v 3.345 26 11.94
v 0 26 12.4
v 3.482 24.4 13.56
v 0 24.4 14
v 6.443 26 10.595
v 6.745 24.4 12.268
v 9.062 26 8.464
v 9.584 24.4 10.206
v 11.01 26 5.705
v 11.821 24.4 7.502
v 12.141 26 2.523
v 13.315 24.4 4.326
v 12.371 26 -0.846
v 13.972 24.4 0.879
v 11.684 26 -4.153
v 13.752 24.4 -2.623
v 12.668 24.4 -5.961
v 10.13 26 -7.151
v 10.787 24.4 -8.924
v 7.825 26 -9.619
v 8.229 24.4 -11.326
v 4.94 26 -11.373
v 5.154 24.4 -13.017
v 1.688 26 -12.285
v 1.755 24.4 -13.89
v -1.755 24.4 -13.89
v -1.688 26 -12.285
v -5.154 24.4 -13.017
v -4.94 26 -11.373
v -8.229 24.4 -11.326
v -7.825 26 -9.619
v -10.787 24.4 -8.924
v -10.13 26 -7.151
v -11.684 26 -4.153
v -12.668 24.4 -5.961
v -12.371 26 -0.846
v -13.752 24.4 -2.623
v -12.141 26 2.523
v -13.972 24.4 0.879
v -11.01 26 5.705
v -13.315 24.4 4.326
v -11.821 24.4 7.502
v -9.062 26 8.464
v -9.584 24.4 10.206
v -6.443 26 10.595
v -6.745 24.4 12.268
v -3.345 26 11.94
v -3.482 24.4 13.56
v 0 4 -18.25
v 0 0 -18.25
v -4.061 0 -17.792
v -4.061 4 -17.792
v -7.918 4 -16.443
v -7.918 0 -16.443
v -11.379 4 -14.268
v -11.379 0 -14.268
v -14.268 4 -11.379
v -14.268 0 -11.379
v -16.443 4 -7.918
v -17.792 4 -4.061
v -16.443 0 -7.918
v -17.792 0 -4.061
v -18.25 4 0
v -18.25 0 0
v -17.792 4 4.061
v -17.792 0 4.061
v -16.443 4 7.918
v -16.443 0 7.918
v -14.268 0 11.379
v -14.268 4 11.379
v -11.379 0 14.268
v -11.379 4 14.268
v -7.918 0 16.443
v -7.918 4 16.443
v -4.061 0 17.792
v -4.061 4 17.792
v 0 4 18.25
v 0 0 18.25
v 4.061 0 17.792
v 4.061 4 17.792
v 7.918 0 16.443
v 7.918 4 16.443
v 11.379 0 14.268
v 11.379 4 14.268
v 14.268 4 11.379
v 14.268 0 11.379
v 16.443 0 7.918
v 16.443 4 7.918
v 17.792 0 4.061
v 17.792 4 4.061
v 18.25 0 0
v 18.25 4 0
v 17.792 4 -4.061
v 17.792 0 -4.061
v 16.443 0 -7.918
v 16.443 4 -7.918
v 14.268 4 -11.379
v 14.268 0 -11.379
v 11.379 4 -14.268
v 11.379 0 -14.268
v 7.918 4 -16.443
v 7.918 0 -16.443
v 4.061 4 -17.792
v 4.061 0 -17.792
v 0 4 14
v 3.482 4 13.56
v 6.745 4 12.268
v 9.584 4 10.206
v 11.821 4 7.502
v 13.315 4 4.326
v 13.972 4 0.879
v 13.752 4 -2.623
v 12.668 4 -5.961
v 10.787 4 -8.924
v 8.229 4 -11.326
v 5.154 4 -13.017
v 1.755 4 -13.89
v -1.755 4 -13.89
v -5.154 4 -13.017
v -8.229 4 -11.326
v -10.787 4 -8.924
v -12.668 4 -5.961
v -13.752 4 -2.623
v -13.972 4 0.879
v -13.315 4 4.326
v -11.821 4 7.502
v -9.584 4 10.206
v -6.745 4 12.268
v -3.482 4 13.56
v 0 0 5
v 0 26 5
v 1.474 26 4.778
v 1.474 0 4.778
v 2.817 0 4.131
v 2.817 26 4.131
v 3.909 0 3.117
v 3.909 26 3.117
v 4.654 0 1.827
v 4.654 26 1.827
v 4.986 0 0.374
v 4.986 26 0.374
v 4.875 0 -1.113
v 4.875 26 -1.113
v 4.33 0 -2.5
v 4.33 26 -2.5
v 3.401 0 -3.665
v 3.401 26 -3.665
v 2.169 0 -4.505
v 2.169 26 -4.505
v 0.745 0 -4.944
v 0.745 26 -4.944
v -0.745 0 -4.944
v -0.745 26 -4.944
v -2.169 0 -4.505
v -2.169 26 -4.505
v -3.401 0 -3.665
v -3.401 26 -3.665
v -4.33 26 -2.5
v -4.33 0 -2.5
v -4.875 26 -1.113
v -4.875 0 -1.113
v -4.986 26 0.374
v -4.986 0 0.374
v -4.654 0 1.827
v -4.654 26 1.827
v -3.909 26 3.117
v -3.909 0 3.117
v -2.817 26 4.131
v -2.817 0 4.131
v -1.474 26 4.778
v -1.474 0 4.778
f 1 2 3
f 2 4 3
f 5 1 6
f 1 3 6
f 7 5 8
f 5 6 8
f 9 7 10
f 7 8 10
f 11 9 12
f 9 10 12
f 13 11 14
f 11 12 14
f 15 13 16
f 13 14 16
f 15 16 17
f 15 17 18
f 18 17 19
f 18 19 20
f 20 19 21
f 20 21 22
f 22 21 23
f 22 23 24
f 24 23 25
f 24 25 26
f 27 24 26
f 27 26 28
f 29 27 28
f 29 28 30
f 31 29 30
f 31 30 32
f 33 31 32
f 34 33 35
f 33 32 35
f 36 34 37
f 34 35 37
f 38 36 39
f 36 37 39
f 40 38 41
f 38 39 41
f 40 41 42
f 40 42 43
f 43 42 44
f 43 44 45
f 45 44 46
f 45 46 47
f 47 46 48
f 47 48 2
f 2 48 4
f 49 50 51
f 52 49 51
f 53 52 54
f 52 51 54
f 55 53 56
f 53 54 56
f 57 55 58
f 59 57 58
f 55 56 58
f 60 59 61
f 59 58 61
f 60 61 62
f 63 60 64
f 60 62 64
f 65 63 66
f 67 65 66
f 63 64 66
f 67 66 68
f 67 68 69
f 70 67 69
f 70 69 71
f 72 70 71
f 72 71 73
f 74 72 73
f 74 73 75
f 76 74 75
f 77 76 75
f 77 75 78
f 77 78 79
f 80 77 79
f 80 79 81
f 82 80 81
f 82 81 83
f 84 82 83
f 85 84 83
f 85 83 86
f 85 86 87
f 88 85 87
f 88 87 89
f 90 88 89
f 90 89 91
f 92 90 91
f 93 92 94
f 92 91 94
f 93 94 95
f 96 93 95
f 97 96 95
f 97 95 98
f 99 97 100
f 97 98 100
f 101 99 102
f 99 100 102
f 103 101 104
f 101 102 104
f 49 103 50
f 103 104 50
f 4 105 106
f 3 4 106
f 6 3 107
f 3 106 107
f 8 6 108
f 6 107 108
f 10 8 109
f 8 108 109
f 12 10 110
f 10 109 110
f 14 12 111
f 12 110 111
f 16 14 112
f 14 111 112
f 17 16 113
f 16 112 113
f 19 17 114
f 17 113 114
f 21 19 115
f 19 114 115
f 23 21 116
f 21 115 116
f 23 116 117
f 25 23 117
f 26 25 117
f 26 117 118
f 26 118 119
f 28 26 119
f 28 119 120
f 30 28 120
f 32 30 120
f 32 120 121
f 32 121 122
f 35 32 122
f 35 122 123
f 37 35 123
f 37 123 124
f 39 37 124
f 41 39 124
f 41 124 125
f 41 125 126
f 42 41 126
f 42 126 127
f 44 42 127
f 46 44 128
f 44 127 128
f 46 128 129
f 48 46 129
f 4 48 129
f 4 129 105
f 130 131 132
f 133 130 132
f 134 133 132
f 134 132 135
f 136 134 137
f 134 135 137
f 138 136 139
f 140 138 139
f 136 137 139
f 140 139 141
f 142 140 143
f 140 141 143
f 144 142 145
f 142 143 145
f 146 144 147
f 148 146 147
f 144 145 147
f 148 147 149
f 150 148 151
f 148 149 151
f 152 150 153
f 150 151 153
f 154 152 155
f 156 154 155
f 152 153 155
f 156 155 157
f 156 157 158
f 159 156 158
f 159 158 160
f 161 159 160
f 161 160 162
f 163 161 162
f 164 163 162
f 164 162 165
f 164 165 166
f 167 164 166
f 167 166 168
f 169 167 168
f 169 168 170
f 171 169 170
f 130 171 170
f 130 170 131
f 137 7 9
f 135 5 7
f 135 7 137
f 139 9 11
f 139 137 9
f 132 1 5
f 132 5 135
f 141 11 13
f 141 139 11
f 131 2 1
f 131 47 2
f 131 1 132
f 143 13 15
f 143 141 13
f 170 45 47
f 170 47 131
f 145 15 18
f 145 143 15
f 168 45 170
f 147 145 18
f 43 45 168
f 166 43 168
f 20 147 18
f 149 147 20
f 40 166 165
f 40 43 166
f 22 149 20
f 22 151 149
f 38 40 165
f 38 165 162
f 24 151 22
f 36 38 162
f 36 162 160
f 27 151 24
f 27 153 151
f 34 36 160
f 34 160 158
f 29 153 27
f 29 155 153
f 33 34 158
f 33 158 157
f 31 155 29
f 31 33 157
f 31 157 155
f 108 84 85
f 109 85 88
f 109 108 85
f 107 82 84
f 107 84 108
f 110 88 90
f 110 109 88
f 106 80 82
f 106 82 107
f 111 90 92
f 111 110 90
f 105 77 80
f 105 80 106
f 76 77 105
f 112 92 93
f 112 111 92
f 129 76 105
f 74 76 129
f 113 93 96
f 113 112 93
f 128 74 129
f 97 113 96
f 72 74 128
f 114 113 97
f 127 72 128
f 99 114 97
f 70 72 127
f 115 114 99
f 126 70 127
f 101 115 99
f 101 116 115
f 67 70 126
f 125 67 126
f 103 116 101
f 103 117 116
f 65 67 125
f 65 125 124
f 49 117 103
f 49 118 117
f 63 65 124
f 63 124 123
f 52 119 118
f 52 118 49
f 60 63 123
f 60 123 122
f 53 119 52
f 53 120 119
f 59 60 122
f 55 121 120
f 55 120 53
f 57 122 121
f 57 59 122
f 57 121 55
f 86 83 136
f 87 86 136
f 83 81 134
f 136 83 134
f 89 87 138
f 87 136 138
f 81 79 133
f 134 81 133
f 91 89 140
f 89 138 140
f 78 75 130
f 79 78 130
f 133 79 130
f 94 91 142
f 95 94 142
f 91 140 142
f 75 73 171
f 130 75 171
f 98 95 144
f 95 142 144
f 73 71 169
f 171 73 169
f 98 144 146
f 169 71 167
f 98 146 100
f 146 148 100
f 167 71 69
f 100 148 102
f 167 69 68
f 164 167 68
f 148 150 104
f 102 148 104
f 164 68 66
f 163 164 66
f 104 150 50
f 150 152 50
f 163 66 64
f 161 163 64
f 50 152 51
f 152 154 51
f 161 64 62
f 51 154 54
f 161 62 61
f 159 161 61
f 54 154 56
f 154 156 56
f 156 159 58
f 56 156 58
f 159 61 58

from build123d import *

# Parameters (mm, degrees)
SKETCH1_R           = 18.25
BOSS_EXTRUDE1_DEPTH = 26
CUT_EXTRUDE1_START  = -22
SKETCH2_R           = 18.25
SKETCH2_R_2         = 14
CUT_EXTRUDE1_DEPTH  = 22
SKETCH3_R           = 5
CUT_EXTRUDE2_DEPTH  = 37.635024225


with BuildPart() as part:
    # Sketch1 → Boss-Extrude1 (new body)
    with BuildSketch(Plane(origin=(0, 0, 0), x_dir=(1, 0, 0), z_dir=(0, 1, 0))):
        with Locations(Location((0, 0, 0), (0, 0, 90))):
            Circle(SKETCH1_R)
    extrude(amount=BOSS_EXTRUDE1_DEPTH)

    # Sketch2 → Cut-Extrude1 (cut)
    with BuildSketch(Plane(origin=(0, 26, 0), x_dir=(1, 0, 0), z_dir=(0, 1, 0)).offset(CUT_EXTRUDE1_START)):
        with Locations(Location((0, 0, 0), (0, 0, 90))):
            Circle(SKETCH2_R)
        with Locations(Location((0, 0, 0), (0, 0, 270))):
            Circle(SKETCH2_R_2, mode=Mode.SUBTRACT)
    extrude(amount=CUT_EXTRUDE1_DEPTH, mode=Mode.SUBTRACT)

    # Sketch3 → Cut-Extrude2 (cut, through all)
    with BuildSketch(Plane(origin=(0, 26, 0), x_dir=(1, 0, 0), z_dir=(0, 1, 0))):
        with Locations(Location((0, 0, 0), (0, 0, 270))):
            Circle(SKETCH3_R)
    extrude(amount=-CUT_EXTRUDE2_DEPTH, mode=Mode.SUBTRACT)

    # Sketch4 → Cut-Revolve1 (revolve, cut)
    with BuildSketch(Plane(origin=(0, 0, 0), x_dir=(0, 0, -1), z_dir=(1, 0, 0))):
        Polygon((-14, 24.4), (-14, 26), (-12.4, 26), align=None)
    revolve(axis=Axis((0, -1000, 0), (0, 1, 0)), mode=Mode.SUBTRACT)


solid = part.part
